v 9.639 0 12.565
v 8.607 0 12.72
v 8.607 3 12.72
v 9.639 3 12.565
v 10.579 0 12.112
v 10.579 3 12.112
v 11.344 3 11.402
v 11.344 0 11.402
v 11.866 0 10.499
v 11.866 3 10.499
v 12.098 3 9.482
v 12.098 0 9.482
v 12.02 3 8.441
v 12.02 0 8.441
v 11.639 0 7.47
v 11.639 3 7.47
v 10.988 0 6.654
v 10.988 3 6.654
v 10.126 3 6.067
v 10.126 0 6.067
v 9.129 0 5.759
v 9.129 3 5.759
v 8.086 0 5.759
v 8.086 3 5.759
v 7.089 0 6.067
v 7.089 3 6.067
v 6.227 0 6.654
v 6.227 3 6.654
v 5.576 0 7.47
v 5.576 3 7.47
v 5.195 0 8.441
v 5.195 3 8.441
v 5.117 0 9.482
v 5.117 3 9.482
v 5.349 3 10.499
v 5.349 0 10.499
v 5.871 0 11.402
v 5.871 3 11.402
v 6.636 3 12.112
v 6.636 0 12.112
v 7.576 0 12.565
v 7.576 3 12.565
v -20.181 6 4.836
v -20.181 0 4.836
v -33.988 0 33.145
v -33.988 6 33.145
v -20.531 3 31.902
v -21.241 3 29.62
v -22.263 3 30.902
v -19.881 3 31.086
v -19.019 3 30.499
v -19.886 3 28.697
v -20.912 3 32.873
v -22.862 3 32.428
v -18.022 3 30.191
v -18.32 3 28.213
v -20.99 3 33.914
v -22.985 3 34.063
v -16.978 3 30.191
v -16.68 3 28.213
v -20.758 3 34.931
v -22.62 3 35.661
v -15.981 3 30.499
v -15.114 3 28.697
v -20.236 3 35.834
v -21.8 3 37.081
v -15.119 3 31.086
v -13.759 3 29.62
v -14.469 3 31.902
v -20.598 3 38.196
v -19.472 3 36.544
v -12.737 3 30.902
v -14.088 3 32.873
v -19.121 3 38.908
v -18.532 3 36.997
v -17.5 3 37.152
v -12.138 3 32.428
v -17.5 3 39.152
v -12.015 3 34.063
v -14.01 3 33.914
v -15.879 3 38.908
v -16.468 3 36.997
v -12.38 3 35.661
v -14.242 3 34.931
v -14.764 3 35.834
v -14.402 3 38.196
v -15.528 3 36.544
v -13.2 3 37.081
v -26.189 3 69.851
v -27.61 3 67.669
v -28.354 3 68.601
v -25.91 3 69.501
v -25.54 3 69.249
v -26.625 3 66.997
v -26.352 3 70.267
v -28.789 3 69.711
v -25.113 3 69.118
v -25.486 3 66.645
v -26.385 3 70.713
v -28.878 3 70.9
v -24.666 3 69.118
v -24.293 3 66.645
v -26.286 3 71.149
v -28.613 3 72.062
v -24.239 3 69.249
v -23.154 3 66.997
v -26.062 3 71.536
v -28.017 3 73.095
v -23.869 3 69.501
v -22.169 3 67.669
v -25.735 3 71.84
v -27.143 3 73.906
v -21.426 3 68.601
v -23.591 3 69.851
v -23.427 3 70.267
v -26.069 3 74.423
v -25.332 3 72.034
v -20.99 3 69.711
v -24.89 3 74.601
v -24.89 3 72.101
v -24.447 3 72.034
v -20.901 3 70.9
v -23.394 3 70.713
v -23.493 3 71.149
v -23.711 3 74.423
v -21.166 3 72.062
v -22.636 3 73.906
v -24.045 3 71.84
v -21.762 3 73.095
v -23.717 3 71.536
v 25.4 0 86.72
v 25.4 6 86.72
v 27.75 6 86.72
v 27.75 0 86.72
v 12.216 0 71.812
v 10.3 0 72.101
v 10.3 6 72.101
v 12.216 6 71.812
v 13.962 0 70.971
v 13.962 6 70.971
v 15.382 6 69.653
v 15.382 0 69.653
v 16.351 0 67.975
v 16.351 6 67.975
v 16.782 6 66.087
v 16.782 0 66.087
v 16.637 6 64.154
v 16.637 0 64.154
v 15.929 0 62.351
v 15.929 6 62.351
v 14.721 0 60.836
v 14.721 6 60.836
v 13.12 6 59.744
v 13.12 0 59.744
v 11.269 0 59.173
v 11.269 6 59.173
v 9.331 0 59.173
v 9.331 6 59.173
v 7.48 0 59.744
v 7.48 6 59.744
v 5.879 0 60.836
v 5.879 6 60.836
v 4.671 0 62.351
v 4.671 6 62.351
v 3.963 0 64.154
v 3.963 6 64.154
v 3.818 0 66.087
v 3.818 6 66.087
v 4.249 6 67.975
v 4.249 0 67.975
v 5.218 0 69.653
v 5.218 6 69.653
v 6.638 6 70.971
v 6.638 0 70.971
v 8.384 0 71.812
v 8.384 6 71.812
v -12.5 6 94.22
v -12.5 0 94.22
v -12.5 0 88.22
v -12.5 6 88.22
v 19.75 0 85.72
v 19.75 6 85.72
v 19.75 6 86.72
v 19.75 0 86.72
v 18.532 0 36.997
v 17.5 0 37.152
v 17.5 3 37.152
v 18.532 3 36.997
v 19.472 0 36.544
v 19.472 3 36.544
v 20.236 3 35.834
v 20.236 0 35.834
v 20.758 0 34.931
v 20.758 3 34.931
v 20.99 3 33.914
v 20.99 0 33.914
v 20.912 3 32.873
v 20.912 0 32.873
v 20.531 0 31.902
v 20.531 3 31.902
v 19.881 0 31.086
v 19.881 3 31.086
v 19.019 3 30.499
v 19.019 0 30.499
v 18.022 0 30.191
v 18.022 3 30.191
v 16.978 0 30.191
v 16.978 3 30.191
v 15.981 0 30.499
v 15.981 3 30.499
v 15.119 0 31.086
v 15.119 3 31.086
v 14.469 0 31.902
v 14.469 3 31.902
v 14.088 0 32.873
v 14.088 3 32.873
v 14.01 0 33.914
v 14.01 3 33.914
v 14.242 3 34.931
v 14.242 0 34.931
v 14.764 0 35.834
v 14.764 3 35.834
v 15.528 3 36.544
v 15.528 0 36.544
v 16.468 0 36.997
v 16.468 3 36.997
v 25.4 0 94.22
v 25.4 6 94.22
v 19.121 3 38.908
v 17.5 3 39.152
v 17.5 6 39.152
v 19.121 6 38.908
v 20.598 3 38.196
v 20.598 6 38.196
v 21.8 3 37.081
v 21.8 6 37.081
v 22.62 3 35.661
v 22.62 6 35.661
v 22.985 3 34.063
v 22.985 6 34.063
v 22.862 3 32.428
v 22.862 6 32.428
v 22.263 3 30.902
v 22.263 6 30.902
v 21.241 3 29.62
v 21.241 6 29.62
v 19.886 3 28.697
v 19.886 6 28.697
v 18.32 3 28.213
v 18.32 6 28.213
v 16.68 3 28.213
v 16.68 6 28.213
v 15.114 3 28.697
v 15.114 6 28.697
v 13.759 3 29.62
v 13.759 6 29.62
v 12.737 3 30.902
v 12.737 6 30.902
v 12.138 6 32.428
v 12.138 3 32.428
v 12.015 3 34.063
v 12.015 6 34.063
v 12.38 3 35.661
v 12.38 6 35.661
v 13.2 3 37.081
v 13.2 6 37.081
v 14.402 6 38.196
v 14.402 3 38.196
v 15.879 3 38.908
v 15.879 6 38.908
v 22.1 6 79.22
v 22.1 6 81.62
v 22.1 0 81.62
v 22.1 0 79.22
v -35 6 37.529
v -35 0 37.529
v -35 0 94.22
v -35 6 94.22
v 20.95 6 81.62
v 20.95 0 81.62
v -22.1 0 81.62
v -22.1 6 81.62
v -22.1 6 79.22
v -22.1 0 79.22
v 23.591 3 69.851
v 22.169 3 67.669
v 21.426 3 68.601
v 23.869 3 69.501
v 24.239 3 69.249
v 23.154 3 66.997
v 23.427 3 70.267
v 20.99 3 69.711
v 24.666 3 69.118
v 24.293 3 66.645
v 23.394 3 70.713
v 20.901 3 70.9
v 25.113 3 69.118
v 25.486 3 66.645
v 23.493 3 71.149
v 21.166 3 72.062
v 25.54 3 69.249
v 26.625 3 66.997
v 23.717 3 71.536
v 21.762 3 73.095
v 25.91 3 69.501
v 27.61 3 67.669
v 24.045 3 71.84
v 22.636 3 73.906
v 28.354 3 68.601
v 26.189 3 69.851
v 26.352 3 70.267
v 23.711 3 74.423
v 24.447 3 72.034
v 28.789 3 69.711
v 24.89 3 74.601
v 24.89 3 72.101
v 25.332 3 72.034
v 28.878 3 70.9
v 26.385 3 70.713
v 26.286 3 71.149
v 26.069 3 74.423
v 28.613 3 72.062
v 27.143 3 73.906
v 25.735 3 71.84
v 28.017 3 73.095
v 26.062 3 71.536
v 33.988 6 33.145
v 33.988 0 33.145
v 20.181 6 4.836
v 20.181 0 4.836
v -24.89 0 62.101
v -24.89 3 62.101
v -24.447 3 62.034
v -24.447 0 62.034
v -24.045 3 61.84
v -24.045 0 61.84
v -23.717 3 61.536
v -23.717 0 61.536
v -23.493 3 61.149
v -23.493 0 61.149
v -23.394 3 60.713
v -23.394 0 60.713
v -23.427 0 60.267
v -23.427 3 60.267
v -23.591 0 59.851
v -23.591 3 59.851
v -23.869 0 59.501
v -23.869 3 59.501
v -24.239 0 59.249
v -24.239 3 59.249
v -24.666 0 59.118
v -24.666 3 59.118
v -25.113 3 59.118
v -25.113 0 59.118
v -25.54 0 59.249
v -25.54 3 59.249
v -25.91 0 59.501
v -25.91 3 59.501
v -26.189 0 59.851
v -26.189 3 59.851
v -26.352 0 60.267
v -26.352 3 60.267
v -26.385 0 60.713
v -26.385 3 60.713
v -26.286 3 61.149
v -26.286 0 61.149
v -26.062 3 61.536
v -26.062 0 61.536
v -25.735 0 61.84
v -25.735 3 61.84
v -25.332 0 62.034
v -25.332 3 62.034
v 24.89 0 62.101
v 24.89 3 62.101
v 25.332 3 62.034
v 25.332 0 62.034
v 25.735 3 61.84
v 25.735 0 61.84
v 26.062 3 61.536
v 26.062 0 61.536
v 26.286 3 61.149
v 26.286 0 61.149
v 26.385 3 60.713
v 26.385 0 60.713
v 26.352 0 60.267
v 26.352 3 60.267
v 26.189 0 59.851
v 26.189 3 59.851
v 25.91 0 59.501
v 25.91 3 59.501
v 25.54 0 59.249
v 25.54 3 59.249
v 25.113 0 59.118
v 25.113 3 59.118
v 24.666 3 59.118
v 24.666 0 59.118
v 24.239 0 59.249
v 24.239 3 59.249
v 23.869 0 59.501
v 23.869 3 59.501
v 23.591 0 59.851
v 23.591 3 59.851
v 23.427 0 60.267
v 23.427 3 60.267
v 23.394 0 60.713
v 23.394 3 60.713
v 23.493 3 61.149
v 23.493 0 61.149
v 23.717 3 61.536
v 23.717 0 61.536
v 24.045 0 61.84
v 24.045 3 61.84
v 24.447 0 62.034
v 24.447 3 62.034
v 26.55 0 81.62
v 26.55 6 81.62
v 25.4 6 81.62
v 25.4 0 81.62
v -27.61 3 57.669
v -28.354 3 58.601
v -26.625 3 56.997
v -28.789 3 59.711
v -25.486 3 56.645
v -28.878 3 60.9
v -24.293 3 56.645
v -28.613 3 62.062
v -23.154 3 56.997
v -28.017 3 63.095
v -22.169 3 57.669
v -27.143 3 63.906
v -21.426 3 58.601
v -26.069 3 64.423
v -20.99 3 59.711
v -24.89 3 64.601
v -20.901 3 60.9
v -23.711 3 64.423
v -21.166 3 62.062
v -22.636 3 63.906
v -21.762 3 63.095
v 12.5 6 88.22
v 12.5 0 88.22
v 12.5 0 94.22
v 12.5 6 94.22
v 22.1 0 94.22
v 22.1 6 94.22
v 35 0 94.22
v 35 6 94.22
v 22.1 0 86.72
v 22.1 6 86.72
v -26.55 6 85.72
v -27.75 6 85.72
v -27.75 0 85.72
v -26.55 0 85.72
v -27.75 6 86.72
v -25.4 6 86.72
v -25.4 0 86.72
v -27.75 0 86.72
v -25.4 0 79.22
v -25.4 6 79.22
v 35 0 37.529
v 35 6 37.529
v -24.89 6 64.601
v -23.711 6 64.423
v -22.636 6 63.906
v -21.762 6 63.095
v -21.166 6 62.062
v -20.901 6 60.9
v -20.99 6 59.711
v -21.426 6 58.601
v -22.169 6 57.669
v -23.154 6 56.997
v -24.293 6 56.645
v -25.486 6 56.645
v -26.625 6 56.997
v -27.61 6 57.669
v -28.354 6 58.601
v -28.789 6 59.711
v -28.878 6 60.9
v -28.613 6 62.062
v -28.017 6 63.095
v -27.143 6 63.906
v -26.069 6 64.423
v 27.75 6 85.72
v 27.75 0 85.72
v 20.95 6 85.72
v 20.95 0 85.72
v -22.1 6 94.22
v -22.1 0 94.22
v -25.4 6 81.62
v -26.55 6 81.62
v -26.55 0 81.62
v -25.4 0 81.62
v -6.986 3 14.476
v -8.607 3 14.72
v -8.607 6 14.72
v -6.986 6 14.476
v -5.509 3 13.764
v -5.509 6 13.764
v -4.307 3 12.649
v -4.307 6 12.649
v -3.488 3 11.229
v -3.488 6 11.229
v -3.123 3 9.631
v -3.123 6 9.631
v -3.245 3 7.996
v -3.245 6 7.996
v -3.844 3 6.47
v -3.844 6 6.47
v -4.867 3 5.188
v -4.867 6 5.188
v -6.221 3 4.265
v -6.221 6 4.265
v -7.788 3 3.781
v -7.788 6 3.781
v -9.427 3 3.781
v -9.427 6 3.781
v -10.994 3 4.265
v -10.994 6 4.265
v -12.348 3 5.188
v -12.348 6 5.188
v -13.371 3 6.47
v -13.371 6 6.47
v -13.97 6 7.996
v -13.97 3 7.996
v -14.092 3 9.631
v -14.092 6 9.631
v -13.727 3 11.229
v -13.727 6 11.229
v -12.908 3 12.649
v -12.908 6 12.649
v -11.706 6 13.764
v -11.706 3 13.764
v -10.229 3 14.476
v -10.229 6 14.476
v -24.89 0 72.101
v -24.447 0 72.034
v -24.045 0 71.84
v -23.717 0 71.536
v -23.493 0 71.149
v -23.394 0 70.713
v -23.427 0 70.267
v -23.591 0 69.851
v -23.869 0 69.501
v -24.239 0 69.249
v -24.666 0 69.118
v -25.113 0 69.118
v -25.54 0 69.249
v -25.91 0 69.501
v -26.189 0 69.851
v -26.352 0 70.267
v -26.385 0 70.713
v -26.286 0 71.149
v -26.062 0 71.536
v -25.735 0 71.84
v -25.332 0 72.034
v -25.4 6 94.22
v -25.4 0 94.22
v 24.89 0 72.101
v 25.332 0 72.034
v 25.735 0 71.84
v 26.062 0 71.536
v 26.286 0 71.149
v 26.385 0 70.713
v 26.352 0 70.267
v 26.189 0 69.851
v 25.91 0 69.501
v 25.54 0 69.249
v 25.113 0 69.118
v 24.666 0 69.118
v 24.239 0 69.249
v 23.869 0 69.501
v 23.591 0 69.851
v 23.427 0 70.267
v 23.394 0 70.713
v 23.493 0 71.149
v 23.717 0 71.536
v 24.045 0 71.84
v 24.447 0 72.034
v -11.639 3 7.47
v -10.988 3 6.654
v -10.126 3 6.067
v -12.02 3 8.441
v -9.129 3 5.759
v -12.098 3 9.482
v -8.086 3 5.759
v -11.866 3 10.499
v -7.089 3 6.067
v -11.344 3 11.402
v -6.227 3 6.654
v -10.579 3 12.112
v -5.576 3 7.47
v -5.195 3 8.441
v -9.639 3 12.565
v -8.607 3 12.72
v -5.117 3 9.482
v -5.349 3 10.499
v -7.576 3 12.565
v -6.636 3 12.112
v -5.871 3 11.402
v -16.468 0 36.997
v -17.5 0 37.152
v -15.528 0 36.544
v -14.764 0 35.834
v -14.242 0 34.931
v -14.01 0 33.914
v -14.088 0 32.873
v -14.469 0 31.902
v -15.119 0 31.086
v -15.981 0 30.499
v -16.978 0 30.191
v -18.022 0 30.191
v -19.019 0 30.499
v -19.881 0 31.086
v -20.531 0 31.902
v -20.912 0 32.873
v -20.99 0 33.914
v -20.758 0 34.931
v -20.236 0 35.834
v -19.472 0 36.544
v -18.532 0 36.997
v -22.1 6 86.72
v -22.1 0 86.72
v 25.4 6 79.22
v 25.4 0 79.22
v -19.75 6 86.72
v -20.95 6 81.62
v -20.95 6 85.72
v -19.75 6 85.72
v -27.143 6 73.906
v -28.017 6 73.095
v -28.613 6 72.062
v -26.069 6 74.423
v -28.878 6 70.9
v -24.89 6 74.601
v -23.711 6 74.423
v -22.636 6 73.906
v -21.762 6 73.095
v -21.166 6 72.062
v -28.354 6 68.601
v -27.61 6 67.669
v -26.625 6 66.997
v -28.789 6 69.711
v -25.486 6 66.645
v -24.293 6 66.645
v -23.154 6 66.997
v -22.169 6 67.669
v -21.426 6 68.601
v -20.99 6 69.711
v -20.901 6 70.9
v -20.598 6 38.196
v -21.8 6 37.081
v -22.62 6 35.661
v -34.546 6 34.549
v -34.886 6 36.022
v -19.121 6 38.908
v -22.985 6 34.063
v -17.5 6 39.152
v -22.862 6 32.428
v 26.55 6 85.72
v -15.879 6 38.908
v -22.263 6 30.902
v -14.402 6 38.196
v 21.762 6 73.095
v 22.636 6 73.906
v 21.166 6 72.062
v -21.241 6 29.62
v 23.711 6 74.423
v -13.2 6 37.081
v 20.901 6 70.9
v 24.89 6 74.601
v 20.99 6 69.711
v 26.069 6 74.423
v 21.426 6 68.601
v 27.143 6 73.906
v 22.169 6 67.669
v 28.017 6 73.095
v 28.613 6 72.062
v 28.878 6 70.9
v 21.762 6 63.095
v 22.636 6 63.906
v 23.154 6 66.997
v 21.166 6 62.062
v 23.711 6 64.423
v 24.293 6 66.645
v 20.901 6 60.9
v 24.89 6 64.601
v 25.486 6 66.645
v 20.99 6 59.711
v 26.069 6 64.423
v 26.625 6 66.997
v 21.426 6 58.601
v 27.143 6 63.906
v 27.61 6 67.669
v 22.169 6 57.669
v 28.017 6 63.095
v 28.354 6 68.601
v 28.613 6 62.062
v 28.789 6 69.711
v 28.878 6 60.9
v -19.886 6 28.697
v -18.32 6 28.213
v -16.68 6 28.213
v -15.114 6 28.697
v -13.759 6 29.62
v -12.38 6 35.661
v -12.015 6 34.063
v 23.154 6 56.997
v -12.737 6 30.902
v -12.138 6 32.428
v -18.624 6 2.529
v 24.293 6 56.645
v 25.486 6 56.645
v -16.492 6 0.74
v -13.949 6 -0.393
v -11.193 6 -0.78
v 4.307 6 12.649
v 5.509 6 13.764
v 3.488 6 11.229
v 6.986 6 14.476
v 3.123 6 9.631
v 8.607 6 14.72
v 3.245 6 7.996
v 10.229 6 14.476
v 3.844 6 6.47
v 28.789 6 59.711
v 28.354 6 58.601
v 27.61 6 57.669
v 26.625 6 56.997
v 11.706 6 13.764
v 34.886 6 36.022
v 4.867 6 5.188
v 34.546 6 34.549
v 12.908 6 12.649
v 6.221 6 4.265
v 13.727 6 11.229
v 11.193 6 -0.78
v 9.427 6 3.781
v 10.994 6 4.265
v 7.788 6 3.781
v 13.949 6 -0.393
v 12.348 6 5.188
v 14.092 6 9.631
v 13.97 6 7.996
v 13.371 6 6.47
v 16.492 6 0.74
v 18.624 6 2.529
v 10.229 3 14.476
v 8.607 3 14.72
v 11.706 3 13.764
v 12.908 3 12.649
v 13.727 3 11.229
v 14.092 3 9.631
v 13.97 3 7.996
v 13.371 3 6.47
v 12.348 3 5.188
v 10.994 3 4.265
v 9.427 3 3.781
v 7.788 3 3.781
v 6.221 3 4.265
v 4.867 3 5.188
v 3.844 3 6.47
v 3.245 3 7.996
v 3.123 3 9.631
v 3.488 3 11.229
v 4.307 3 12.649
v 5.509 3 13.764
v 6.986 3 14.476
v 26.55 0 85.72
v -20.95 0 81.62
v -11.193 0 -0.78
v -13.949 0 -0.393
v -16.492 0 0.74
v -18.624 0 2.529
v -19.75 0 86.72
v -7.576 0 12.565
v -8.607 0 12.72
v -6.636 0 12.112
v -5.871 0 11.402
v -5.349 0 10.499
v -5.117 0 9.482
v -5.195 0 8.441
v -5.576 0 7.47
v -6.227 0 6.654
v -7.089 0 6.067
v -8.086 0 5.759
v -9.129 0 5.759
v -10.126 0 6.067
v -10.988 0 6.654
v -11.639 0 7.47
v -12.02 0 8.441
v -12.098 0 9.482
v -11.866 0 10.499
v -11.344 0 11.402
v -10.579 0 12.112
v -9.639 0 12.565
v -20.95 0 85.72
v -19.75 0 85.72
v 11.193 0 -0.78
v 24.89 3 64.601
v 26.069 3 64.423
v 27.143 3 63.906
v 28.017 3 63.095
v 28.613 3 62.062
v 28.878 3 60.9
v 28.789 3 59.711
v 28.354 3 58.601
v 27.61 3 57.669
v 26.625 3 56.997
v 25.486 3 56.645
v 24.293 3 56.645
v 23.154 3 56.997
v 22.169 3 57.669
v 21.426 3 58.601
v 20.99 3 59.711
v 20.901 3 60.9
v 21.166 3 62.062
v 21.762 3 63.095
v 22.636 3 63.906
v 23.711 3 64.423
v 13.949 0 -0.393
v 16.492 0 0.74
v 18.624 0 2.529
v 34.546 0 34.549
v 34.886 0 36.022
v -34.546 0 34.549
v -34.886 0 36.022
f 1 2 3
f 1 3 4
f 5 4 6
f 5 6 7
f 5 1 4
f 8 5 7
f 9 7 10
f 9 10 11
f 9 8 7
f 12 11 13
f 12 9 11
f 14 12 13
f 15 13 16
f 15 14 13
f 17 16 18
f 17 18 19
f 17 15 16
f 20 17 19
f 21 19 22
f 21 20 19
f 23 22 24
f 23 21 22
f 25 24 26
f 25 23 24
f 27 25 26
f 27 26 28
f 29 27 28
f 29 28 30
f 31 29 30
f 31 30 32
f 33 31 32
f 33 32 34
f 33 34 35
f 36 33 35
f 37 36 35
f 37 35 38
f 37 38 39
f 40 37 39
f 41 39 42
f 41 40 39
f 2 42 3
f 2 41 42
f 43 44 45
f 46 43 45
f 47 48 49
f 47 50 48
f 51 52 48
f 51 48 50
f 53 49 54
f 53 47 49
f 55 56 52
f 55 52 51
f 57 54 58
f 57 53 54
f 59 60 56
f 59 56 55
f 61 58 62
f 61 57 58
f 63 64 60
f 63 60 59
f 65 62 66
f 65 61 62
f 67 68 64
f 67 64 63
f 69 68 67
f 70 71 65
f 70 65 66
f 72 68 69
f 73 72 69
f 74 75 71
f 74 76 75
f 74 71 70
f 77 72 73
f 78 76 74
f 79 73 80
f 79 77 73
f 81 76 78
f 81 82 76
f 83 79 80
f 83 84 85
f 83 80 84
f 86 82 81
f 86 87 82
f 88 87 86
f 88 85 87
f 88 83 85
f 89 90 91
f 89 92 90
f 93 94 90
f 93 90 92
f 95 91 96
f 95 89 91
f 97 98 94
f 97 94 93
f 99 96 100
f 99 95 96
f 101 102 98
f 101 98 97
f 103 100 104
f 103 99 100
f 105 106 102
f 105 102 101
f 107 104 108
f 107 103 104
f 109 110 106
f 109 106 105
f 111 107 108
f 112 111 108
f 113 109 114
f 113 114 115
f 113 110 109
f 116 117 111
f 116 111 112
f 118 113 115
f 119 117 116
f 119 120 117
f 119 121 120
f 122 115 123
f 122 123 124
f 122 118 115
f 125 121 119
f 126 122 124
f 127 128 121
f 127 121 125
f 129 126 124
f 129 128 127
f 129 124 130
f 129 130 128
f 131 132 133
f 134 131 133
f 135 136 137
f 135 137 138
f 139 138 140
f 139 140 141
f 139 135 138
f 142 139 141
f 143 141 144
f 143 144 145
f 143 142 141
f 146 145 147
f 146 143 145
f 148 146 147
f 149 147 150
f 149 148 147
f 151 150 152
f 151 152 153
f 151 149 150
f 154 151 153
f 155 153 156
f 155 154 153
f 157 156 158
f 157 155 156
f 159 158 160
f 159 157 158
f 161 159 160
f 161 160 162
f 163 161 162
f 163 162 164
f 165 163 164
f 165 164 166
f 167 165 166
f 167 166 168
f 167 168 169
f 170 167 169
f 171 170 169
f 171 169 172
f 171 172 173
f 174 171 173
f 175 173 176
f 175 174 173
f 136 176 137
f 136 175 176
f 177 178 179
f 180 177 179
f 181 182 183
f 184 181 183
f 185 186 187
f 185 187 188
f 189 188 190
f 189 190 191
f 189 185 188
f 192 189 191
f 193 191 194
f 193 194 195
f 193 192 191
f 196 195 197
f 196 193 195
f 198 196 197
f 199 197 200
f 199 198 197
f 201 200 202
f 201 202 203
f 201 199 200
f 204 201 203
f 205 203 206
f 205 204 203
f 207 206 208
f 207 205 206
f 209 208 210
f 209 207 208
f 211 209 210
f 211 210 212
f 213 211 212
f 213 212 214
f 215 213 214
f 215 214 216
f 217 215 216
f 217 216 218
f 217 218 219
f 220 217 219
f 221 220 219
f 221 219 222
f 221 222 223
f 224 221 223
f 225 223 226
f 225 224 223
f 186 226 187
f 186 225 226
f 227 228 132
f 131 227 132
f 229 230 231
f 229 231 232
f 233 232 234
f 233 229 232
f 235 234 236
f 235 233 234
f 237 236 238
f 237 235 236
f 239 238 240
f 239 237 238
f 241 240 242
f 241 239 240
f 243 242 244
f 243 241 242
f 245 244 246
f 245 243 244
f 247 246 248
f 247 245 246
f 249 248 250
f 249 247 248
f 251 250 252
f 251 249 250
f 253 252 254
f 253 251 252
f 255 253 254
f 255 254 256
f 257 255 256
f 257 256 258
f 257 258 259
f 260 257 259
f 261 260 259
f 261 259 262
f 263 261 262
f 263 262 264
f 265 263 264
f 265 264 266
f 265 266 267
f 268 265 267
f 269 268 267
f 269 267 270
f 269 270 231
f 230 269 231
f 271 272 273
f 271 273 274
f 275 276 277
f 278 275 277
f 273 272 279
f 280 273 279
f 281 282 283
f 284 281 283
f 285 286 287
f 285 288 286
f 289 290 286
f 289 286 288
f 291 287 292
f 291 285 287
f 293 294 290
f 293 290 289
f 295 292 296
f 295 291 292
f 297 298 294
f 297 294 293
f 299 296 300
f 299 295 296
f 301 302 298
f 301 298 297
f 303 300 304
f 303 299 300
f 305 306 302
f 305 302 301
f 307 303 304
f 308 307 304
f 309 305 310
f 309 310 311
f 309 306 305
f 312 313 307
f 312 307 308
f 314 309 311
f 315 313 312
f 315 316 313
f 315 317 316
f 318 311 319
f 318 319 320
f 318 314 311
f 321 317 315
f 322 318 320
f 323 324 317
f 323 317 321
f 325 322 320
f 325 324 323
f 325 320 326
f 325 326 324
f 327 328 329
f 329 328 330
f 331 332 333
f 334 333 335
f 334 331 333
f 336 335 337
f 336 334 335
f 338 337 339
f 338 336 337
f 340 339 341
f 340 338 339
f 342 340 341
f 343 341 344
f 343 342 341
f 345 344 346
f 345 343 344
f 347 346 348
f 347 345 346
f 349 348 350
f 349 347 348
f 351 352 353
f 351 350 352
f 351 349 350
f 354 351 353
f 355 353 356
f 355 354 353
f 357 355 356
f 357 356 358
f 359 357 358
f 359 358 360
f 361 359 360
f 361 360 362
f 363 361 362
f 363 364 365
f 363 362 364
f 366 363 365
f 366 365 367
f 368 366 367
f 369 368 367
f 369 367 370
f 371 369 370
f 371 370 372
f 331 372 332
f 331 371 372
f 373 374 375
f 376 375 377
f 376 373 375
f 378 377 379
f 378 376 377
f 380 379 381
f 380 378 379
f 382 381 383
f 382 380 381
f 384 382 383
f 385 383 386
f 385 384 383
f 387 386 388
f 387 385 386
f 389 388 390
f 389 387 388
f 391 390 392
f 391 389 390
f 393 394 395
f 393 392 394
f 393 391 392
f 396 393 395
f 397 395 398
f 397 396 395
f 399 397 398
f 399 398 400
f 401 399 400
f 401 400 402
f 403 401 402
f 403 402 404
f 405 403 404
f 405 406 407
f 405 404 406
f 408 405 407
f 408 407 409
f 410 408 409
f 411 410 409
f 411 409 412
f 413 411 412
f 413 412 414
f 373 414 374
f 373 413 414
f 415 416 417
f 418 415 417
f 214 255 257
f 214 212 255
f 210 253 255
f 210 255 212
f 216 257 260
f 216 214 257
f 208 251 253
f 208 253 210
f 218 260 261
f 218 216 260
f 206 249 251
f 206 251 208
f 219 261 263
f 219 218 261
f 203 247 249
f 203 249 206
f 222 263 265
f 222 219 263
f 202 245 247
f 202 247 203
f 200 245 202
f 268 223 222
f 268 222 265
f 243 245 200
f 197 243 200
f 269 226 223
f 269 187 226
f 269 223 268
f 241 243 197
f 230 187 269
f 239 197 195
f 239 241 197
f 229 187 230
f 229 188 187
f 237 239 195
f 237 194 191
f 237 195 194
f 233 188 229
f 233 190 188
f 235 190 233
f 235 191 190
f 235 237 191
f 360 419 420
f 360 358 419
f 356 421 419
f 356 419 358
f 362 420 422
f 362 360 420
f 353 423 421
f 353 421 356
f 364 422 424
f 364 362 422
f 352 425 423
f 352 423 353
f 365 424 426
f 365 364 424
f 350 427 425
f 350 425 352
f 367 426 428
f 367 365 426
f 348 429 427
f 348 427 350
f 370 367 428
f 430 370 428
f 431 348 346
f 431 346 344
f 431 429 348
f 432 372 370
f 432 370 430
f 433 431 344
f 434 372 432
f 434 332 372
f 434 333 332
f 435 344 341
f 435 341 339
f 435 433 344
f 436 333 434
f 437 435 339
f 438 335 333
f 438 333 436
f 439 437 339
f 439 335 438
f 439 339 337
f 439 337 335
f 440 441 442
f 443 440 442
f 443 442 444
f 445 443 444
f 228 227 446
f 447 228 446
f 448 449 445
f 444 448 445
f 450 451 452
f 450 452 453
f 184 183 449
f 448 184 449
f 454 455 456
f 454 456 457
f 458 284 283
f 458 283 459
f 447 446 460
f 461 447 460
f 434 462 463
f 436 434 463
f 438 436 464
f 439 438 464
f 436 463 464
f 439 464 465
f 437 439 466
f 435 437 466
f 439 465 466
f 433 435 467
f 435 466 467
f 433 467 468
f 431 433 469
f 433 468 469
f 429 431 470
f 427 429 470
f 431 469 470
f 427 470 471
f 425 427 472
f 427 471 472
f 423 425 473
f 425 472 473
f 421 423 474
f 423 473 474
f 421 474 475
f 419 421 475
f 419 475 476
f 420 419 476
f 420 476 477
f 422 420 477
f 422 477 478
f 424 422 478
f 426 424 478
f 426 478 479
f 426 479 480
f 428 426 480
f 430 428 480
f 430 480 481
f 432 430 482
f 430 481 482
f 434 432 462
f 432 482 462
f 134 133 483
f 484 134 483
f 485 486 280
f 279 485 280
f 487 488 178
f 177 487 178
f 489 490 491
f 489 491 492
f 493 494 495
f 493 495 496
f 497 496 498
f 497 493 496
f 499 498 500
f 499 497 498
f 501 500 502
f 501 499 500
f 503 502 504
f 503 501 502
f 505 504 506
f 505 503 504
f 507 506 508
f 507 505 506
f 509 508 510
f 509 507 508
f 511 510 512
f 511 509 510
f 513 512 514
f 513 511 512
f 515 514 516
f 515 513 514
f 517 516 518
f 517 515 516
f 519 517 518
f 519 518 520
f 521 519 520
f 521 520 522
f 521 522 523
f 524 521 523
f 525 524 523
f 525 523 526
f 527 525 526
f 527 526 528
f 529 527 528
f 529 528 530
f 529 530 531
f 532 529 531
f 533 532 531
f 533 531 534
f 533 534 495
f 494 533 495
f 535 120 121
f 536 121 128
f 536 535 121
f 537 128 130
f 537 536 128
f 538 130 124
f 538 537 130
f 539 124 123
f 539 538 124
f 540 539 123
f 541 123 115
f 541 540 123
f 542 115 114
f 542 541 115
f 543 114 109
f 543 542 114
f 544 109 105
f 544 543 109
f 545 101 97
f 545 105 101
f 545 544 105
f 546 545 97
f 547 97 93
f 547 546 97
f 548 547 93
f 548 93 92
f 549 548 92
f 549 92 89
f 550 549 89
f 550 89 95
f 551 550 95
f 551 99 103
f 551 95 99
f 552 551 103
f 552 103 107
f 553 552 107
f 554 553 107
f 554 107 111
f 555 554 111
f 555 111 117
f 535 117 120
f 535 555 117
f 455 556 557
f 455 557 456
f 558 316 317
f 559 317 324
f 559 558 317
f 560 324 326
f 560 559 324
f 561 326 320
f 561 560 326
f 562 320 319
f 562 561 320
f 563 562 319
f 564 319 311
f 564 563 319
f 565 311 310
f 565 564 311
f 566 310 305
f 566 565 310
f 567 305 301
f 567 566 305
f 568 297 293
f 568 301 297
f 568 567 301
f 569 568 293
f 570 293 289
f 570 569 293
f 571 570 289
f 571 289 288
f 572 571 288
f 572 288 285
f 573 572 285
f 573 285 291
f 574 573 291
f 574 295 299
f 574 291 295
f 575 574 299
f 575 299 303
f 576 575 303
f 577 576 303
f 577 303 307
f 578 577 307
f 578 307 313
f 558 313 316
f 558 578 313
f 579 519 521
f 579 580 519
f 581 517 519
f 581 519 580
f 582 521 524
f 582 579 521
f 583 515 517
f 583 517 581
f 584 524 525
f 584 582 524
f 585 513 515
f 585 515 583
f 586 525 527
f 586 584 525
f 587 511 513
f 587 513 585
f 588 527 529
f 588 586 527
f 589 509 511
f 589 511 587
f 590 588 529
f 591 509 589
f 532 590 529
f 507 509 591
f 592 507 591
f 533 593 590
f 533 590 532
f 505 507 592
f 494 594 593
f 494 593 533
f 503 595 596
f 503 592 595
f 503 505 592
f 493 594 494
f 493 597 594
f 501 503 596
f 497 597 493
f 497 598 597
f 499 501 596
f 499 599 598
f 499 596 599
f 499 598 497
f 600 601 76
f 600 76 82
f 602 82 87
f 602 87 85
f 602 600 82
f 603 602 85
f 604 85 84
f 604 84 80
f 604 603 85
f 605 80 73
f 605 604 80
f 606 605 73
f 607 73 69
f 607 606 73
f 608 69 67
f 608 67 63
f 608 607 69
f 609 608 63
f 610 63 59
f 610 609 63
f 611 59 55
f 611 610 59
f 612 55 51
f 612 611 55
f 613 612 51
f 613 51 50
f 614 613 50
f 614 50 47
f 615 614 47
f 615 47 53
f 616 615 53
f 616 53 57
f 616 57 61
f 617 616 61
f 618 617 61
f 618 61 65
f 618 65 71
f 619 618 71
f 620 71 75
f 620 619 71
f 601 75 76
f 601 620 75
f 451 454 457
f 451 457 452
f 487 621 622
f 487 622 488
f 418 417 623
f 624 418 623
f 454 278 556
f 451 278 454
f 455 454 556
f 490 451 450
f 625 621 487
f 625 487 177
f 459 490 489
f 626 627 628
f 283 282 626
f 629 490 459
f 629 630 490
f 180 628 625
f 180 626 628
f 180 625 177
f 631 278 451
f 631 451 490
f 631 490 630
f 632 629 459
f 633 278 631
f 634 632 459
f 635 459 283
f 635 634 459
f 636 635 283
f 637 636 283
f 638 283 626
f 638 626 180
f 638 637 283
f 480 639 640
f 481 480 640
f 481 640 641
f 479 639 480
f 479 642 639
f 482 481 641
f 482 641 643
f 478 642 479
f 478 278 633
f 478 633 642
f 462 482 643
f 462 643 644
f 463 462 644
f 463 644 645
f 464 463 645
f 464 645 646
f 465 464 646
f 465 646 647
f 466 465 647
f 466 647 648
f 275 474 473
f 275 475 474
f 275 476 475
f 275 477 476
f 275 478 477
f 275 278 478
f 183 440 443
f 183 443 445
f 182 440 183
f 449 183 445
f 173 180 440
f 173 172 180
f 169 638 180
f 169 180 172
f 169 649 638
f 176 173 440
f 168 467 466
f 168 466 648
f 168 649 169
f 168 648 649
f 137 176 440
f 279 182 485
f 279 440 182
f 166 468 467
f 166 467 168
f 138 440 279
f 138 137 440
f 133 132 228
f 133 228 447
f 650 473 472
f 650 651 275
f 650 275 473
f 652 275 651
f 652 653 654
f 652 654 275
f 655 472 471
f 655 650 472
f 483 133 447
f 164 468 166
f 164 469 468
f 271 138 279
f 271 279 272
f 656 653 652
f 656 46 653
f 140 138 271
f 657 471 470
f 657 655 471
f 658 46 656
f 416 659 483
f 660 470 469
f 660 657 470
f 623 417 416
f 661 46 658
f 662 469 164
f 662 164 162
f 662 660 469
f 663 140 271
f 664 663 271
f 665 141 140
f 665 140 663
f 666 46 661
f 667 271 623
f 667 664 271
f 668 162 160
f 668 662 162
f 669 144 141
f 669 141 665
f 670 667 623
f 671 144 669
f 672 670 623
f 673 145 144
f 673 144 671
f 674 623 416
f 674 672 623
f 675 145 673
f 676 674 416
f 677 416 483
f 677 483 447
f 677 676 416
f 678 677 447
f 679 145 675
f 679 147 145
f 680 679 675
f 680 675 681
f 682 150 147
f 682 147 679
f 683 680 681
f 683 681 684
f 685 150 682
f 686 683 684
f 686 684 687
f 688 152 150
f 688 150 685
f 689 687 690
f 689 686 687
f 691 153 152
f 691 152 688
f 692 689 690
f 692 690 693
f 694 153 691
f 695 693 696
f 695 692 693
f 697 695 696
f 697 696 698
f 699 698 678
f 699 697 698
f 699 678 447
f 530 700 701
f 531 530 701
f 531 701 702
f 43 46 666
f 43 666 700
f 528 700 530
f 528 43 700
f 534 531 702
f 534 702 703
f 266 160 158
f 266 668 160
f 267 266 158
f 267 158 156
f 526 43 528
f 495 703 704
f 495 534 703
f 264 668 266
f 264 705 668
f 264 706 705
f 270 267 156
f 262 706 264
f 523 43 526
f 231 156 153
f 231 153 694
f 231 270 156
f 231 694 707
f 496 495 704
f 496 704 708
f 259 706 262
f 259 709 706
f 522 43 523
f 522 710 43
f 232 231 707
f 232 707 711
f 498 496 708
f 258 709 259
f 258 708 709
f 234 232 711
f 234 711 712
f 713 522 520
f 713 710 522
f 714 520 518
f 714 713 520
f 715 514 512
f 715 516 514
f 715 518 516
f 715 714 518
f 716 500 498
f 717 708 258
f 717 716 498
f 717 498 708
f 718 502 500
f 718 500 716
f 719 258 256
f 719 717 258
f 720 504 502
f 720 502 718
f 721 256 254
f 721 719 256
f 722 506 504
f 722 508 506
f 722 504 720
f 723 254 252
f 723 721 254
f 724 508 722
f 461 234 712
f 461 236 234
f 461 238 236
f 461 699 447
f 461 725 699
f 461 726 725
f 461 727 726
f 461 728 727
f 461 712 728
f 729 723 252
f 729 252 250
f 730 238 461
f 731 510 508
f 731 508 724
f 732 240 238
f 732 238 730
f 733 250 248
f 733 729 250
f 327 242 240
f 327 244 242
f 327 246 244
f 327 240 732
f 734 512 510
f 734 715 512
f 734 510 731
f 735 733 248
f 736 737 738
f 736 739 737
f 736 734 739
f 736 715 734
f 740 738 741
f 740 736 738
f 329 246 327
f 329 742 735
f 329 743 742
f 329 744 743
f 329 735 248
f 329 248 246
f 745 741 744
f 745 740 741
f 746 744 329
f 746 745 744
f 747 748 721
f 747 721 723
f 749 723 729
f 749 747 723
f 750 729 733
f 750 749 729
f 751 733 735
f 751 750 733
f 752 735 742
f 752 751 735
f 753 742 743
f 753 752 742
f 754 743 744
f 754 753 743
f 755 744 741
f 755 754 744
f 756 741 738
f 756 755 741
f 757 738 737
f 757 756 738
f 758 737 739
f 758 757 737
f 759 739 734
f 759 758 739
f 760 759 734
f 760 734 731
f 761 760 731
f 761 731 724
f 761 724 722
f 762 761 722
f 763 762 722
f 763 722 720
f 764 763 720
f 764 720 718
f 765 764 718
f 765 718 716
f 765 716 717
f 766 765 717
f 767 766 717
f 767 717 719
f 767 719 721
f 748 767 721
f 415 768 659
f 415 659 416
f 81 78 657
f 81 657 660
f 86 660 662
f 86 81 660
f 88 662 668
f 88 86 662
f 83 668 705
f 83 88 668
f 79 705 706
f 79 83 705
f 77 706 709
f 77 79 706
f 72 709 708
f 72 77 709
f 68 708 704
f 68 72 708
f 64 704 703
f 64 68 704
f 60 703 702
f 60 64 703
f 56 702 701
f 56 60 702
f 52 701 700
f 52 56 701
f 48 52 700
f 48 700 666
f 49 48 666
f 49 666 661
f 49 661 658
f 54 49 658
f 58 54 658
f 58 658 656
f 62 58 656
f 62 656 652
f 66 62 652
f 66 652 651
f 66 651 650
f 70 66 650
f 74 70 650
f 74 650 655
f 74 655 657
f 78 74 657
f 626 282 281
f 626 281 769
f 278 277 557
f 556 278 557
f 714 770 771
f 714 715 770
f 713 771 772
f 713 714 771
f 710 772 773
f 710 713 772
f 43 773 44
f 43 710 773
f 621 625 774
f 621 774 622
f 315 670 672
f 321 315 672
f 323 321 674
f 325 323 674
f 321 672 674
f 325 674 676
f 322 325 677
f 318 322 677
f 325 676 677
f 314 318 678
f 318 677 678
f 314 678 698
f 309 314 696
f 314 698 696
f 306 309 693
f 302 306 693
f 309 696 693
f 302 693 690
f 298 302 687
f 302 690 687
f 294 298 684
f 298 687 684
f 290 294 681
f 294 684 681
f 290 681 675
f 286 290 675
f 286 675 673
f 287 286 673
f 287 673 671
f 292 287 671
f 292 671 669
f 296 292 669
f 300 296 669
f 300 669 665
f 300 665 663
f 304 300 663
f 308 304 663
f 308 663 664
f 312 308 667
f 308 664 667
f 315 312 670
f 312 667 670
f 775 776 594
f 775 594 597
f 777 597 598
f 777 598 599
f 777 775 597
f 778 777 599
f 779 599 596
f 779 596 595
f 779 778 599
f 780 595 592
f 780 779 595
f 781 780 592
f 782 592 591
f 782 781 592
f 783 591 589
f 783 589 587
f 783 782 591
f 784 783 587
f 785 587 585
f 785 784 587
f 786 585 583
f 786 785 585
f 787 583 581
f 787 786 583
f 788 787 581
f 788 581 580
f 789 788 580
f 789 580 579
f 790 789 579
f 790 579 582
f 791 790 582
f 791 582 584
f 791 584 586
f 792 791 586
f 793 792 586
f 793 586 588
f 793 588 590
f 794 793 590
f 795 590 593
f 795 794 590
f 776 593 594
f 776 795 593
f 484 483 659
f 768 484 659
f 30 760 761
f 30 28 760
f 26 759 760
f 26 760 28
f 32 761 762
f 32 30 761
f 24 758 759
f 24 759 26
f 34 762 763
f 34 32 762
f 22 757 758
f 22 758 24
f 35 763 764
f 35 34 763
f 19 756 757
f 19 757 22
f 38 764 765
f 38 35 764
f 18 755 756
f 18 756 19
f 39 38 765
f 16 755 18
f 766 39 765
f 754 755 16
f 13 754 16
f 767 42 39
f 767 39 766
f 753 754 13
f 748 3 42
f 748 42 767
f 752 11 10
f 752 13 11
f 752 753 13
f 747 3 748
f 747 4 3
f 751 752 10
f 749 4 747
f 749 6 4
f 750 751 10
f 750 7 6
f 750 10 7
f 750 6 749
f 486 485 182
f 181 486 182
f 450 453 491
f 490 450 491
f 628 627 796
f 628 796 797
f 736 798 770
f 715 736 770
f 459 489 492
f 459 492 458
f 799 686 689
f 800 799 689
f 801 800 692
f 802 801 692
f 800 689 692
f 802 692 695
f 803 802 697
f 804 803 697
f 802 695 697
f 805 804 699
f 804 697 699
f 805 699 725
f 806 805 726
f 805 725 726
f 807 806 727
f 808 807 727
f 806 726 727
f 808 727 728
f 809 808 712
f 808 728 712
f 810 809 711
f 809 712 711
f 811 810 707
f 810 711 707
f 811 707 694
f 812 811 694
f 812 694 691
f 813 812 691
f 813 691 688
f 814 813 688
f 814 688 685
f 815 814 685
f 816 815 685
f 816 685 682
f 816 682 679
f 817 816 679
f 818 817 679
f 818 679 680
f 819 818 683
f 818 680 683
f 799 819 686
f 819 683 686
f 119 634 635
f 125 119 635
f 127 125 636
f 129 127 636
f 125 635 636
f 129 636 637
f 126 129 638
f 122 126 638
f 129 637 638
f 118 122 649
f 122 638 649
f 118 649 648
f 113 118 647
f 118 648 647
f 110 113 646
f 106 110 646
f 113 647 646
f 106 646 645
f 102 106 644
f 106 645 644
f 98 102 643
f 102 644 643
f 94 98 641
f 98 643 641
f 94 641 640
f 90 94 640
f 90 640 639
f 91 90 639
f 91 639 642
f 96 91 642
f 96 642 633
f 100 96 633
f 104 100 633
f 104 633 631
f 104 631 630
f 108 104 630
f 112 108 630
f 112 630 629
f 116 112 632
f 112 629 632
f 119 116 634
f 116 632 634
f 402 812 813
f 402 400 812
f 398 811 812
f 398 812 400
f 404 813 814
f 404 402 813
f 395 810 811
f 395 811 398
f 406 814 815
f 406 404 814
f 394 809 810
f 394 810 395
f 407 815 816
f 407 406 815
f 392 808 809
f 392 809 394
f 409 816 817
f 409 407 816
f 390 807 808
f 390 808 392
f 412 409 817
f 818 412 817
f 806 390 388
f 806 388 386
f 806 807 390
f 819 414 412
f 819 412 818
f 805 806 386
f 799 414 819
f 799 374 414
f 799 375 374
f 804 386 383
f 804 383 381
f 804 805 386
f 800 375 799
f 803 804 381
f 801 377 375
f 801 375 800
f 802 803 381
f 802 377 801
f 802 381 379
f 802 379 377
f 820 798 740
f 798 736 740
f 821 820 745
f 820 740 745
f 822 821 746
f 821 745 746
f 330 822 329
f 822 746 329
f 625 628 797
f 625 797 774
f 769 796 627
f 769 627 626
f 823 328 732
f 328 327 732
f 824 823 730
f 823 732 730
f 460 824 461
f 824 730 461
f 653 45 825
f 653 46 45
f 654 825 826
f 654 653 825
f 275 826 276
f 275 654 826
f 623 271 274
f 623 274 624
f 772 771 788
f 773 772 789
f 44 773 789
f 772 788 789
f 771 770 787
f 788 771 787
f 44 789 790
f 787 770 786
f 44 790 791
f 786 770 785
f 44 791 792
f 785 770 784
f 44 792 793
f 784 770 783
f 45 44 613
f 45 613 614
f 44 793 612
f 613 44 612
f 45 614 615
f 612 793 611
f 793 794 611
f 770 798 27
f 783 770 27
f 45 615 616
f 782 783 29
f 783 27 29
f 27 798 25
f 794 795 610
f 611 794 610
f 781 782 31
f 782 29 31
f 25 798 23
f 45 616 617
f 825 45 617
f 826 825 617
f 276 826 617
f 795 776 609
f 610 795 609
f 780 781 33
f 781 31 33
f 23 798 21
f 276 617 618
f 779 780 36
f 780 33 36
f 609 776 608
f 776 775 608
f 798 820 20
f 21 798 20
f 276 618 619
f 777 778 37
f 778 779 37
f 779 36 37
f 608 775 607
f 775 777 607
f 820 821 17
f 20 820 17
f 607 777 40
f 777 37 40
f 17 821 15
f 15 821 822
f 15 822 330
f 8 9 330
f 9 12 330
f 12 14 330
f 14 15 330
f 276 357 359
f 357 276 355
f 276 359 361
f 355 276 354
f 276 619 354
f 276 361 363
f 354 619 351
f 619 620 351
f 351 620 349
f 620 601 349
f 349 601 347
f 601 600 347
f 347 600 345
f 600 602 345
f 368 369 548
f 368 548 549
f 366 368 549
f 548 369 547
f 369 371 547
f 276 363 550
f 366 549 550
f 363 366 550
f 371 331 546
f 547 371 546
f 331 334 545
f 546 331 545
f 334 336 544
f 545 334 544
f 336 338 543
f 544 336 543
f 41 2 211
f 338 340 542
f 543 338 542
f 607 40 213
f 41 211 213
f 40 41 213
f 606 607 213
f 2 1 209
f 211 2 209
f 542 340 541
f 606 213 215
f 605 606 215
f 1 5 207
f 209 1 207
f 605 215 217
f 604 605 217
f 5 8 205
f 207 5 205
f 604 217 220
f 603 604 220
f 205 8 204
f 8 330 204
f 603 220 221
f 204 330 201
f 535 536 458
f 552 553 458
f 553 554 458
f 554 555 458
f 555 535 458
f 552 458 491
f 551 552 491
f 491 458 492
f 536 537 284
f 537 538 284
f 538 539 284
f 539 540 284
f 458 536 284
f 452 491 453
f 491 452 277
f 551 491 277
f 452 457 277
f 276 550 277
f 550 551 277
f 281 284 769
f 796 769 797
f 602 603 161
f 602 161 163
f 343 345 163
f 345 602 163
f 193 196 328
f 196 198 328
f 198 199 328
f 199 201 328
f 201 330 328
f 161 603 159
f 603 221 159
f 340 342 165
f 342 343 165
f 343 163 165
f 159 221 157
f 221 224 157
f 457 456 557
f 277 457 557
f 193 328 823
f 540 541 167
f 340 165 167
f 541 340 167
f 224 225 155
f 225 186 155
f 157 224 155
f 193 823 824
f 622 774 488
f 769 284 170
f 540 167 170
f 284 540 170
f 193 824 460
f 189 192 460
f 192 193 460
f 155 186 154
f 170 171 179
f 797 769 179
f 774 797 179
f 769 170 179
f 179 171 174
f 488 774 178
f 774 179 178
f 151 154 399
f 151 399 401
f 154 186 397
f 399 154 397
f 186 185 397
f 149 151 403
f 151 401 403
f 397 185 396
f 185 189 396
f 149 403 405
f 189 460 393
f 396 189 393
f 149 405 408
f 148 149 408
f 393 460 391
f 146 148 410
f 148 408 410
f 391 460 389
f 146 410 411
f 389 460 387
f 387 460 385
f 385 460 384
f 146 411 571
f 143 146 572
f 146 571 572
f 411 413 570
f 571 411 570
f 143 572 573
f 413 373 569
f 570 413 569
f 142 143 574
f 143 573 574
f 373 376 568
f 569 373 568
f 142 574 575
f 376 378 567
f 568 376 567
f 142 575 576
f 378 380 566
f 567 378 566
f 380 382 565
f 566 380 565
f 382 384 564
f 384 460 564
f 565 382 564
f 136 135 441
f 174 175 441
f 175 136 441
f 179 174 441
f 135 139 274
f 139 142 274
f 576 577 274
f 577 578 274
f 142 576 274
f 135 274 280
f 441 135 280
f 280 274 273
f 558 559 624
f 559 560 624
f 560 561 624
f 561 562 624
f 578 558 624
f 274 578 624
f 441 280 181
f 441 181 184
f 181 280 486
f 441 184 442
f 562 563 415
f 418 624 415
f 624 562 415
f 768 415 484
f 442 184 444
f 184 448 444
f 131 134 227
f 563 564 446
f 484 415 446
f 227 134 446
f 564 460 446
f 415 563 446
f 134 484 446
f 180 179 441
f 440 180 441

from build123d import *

# Parameters (mm, degrees)
SKETCH1_R           = 1.5
SKETCH1_R_2         = 6.5
SKETCH1_R_3         = 5.5
BOSS_EXTRUDE1_DEPTH = 6
FILLET1_R           = 10
SKETCH2_R           = 4
CUT_EXTRUDE1_DEPTH  = 3
SKETCH1_3_R         = 5.5
SKETCH1_3_R_2       = 3.5
BOSS_EXTRUDE2_DEPTH = 3
CUT_EXTRUDE2_DEPTH  = 10


with BuildPart() as part:
    # Sketch1 → Boss-Extrude1 (new body)
    with BuildSketch(Plane(origin=(0, 0, 0), x_dir=(1, 0, 0), z_dir=(0, 1, 0))):
        Polygon((17.441626812, 0.78), (-17.441626812, 0.78), (-35, -35.22), (-35, -94.22), (-12.5, -94.22), (-12.5, -88.22), (12.5, -88.22), (12.5, -94.22), (35, -94.22), (35, -35.22), align=None)
        with Locations((-24.889613301, -70.60075616)):
            Circle(SKETCH1_R, mode=Mode.SUBTRACT)
        with Locations((-24.889613301, -60.60075616)):
            Circle(SKETCH1_R, mode=Mode.SUBTRACT)
        with Locations((24.889613301, -70.60075616)):
            Circle(SKETCH1_R, mode=Mode.SUBTRACT)
        with Locations((10.3, -65.60075616)):
            Circle(SKETCH1_R_2, mode=Mode.SUBTRACT)
        with Locations((24.889613301, -60.60075616)):
            Circle(SKETCH1_R, mode=Mode.SUBTRACT)
        with Locations((-17.5, -33.65200814)):
            Circle(SKETCH1_R_3, mode=Mode.SUBTRACT)
        with Locations((-8.607476274, -9.22)):
            Circle(SKETCH1_R_3, mode=Mode.SUBTRACT)
        with Locations((17.5, -33.65200814)):
            Circle(SKETCH1_R_3, mode=Mode.SUBTRACT)
        with Locations((8.607476274, -9.22)):
            Circle(SKETCH1_R_3, mode=Mode.SUBTRACT)
    extrude(amount=BOSS_EXTRUDE1_DEPTH)

    # Fillet1
    fillet1_edges = [part.edges().sort_by_distance(p)[0] for p in [
        (35, 3, 35.22),
        (17.441626812, 3, -0.78),
        (-17.441626812, 3, -0.78),
        (-35, 3, 35.22),
    ]]
    fillet(fillet1_edges, radius=FILLET1_R)

    # Sketch2 → Cut-Extrude1 (cut)
    with BuildSketch(Plane(origin=(0, 6, 0), x_dir=(1, 0, 0), z_dir=(0, 1, 0))):
        with Locations((24.889613301, -60.60075616)):
            Circle(SKETCH2_R)
        with Locations((24.889613301, -70.60075616)):
            Circle(SKETCH2_R)
        with Locations((-24.889613301, -60.60075616)):
            Circle(SKETCH2_R)
        with Locations((-24.889613301, -70.60075616)):
            Circle(SKETCH2_R)
    extrude(amount=-CUT_EXTRUDE1_DEPTH, mode=Mode.SUBTRACT)

    # Sketch1<3> → Boss-Extrude2 (add)
    # profile 1 of 4: a face of its own
    with BuildSketch(Plane(origin=(0, 0, 0), x_dir=(1, 0, 0), z_dir=(0, 1, 0))):
        with Locations((8.607476274, -9.22)):
            Circle(SKETCH1_3_R)
        with Locations((8.607476274, -9.22)):
            Circle(SKETCH1_3_R_2, mode=Mode.SUBTRACT)
    # profile 2 of 4: a face of its own
    with BuildSketch(Plane(origin=(0, 0, 0), x_dir=(1, 0, 0), z_dir=(0, 1, 0))):
        with Locations((-8.607476274, -9.22)):
            Circle(SKETCH1_3_R)
        with Locations((-8.607476274, -9.22)):
            Circle(SKETCH1_3_R_2, mode=Mode.SUBTRACT)
    # profile 3 of 4: a face of its own
    with BuildSketch(Plane(origin=(0, 0, 0), x_dir=(1, 0, 0), z_dir=(0, 1, 0))):
        with Locations((-17.5, -33.65200814)):
            Circle(SKETCH1_3_R)
        with Locations((-17.5, -33.65200814)):
            Circle(SKETCH1_3_R_2, mode=Mode.SUBTRACT)
    # profile 4 of 4: a face of its own
    with BuildSketch(Plane(origin=(0, 0, 0), x_dir=(1, 0, 0), z_dir=(0, 1, 0))):
        with Locations((17.5, -33.65200814)):
            Circle(SKETCH1_3_R)
        with Locations((17.5, -33.65200814)):
            Circle(SKETCH1_3_R_2, mode=Mode.SUBTRACT)
    extrude(amount=BOSS_EXTRUDE2_DEPTH)

    # Sketch3 → Cut-Extrude2 (cut)
    with BuildSketch(Plane(origin=(0, 6, 0), x_dir=(1, 0, 0), z_dir=(0, 1, 0))):
        Polygon((22.1, -81.62), (20.95, -81.62), (20.95, -85.72), (19.75, -85.72), (19.75, -86.72), (22.1, -86.72), (22.1, -94.22), (25.4, -94.22), (25.4, -86.72), (27.75, -86.72), (27.75, -85.72), (26.55, -85.72), (26.55, -81.62), (25.4, -81.62), (25.4, -79.22), (22.1, -79.22), align=None)
    cut_extrude2 = extrude(amount=-CUT_EXTRUDE2_DEPTH, mode=Mode.SUBTRACT)

    # Mirror1: Cut-Extrude2 across plane
    add(cut_extrude2.mirror(Plane(origin=(0, 0, 0), x_dir=(0, 0, 1), z_dir=(1, 0, 0))), mode=Mode.SUBTRACT)


solid = part.part
